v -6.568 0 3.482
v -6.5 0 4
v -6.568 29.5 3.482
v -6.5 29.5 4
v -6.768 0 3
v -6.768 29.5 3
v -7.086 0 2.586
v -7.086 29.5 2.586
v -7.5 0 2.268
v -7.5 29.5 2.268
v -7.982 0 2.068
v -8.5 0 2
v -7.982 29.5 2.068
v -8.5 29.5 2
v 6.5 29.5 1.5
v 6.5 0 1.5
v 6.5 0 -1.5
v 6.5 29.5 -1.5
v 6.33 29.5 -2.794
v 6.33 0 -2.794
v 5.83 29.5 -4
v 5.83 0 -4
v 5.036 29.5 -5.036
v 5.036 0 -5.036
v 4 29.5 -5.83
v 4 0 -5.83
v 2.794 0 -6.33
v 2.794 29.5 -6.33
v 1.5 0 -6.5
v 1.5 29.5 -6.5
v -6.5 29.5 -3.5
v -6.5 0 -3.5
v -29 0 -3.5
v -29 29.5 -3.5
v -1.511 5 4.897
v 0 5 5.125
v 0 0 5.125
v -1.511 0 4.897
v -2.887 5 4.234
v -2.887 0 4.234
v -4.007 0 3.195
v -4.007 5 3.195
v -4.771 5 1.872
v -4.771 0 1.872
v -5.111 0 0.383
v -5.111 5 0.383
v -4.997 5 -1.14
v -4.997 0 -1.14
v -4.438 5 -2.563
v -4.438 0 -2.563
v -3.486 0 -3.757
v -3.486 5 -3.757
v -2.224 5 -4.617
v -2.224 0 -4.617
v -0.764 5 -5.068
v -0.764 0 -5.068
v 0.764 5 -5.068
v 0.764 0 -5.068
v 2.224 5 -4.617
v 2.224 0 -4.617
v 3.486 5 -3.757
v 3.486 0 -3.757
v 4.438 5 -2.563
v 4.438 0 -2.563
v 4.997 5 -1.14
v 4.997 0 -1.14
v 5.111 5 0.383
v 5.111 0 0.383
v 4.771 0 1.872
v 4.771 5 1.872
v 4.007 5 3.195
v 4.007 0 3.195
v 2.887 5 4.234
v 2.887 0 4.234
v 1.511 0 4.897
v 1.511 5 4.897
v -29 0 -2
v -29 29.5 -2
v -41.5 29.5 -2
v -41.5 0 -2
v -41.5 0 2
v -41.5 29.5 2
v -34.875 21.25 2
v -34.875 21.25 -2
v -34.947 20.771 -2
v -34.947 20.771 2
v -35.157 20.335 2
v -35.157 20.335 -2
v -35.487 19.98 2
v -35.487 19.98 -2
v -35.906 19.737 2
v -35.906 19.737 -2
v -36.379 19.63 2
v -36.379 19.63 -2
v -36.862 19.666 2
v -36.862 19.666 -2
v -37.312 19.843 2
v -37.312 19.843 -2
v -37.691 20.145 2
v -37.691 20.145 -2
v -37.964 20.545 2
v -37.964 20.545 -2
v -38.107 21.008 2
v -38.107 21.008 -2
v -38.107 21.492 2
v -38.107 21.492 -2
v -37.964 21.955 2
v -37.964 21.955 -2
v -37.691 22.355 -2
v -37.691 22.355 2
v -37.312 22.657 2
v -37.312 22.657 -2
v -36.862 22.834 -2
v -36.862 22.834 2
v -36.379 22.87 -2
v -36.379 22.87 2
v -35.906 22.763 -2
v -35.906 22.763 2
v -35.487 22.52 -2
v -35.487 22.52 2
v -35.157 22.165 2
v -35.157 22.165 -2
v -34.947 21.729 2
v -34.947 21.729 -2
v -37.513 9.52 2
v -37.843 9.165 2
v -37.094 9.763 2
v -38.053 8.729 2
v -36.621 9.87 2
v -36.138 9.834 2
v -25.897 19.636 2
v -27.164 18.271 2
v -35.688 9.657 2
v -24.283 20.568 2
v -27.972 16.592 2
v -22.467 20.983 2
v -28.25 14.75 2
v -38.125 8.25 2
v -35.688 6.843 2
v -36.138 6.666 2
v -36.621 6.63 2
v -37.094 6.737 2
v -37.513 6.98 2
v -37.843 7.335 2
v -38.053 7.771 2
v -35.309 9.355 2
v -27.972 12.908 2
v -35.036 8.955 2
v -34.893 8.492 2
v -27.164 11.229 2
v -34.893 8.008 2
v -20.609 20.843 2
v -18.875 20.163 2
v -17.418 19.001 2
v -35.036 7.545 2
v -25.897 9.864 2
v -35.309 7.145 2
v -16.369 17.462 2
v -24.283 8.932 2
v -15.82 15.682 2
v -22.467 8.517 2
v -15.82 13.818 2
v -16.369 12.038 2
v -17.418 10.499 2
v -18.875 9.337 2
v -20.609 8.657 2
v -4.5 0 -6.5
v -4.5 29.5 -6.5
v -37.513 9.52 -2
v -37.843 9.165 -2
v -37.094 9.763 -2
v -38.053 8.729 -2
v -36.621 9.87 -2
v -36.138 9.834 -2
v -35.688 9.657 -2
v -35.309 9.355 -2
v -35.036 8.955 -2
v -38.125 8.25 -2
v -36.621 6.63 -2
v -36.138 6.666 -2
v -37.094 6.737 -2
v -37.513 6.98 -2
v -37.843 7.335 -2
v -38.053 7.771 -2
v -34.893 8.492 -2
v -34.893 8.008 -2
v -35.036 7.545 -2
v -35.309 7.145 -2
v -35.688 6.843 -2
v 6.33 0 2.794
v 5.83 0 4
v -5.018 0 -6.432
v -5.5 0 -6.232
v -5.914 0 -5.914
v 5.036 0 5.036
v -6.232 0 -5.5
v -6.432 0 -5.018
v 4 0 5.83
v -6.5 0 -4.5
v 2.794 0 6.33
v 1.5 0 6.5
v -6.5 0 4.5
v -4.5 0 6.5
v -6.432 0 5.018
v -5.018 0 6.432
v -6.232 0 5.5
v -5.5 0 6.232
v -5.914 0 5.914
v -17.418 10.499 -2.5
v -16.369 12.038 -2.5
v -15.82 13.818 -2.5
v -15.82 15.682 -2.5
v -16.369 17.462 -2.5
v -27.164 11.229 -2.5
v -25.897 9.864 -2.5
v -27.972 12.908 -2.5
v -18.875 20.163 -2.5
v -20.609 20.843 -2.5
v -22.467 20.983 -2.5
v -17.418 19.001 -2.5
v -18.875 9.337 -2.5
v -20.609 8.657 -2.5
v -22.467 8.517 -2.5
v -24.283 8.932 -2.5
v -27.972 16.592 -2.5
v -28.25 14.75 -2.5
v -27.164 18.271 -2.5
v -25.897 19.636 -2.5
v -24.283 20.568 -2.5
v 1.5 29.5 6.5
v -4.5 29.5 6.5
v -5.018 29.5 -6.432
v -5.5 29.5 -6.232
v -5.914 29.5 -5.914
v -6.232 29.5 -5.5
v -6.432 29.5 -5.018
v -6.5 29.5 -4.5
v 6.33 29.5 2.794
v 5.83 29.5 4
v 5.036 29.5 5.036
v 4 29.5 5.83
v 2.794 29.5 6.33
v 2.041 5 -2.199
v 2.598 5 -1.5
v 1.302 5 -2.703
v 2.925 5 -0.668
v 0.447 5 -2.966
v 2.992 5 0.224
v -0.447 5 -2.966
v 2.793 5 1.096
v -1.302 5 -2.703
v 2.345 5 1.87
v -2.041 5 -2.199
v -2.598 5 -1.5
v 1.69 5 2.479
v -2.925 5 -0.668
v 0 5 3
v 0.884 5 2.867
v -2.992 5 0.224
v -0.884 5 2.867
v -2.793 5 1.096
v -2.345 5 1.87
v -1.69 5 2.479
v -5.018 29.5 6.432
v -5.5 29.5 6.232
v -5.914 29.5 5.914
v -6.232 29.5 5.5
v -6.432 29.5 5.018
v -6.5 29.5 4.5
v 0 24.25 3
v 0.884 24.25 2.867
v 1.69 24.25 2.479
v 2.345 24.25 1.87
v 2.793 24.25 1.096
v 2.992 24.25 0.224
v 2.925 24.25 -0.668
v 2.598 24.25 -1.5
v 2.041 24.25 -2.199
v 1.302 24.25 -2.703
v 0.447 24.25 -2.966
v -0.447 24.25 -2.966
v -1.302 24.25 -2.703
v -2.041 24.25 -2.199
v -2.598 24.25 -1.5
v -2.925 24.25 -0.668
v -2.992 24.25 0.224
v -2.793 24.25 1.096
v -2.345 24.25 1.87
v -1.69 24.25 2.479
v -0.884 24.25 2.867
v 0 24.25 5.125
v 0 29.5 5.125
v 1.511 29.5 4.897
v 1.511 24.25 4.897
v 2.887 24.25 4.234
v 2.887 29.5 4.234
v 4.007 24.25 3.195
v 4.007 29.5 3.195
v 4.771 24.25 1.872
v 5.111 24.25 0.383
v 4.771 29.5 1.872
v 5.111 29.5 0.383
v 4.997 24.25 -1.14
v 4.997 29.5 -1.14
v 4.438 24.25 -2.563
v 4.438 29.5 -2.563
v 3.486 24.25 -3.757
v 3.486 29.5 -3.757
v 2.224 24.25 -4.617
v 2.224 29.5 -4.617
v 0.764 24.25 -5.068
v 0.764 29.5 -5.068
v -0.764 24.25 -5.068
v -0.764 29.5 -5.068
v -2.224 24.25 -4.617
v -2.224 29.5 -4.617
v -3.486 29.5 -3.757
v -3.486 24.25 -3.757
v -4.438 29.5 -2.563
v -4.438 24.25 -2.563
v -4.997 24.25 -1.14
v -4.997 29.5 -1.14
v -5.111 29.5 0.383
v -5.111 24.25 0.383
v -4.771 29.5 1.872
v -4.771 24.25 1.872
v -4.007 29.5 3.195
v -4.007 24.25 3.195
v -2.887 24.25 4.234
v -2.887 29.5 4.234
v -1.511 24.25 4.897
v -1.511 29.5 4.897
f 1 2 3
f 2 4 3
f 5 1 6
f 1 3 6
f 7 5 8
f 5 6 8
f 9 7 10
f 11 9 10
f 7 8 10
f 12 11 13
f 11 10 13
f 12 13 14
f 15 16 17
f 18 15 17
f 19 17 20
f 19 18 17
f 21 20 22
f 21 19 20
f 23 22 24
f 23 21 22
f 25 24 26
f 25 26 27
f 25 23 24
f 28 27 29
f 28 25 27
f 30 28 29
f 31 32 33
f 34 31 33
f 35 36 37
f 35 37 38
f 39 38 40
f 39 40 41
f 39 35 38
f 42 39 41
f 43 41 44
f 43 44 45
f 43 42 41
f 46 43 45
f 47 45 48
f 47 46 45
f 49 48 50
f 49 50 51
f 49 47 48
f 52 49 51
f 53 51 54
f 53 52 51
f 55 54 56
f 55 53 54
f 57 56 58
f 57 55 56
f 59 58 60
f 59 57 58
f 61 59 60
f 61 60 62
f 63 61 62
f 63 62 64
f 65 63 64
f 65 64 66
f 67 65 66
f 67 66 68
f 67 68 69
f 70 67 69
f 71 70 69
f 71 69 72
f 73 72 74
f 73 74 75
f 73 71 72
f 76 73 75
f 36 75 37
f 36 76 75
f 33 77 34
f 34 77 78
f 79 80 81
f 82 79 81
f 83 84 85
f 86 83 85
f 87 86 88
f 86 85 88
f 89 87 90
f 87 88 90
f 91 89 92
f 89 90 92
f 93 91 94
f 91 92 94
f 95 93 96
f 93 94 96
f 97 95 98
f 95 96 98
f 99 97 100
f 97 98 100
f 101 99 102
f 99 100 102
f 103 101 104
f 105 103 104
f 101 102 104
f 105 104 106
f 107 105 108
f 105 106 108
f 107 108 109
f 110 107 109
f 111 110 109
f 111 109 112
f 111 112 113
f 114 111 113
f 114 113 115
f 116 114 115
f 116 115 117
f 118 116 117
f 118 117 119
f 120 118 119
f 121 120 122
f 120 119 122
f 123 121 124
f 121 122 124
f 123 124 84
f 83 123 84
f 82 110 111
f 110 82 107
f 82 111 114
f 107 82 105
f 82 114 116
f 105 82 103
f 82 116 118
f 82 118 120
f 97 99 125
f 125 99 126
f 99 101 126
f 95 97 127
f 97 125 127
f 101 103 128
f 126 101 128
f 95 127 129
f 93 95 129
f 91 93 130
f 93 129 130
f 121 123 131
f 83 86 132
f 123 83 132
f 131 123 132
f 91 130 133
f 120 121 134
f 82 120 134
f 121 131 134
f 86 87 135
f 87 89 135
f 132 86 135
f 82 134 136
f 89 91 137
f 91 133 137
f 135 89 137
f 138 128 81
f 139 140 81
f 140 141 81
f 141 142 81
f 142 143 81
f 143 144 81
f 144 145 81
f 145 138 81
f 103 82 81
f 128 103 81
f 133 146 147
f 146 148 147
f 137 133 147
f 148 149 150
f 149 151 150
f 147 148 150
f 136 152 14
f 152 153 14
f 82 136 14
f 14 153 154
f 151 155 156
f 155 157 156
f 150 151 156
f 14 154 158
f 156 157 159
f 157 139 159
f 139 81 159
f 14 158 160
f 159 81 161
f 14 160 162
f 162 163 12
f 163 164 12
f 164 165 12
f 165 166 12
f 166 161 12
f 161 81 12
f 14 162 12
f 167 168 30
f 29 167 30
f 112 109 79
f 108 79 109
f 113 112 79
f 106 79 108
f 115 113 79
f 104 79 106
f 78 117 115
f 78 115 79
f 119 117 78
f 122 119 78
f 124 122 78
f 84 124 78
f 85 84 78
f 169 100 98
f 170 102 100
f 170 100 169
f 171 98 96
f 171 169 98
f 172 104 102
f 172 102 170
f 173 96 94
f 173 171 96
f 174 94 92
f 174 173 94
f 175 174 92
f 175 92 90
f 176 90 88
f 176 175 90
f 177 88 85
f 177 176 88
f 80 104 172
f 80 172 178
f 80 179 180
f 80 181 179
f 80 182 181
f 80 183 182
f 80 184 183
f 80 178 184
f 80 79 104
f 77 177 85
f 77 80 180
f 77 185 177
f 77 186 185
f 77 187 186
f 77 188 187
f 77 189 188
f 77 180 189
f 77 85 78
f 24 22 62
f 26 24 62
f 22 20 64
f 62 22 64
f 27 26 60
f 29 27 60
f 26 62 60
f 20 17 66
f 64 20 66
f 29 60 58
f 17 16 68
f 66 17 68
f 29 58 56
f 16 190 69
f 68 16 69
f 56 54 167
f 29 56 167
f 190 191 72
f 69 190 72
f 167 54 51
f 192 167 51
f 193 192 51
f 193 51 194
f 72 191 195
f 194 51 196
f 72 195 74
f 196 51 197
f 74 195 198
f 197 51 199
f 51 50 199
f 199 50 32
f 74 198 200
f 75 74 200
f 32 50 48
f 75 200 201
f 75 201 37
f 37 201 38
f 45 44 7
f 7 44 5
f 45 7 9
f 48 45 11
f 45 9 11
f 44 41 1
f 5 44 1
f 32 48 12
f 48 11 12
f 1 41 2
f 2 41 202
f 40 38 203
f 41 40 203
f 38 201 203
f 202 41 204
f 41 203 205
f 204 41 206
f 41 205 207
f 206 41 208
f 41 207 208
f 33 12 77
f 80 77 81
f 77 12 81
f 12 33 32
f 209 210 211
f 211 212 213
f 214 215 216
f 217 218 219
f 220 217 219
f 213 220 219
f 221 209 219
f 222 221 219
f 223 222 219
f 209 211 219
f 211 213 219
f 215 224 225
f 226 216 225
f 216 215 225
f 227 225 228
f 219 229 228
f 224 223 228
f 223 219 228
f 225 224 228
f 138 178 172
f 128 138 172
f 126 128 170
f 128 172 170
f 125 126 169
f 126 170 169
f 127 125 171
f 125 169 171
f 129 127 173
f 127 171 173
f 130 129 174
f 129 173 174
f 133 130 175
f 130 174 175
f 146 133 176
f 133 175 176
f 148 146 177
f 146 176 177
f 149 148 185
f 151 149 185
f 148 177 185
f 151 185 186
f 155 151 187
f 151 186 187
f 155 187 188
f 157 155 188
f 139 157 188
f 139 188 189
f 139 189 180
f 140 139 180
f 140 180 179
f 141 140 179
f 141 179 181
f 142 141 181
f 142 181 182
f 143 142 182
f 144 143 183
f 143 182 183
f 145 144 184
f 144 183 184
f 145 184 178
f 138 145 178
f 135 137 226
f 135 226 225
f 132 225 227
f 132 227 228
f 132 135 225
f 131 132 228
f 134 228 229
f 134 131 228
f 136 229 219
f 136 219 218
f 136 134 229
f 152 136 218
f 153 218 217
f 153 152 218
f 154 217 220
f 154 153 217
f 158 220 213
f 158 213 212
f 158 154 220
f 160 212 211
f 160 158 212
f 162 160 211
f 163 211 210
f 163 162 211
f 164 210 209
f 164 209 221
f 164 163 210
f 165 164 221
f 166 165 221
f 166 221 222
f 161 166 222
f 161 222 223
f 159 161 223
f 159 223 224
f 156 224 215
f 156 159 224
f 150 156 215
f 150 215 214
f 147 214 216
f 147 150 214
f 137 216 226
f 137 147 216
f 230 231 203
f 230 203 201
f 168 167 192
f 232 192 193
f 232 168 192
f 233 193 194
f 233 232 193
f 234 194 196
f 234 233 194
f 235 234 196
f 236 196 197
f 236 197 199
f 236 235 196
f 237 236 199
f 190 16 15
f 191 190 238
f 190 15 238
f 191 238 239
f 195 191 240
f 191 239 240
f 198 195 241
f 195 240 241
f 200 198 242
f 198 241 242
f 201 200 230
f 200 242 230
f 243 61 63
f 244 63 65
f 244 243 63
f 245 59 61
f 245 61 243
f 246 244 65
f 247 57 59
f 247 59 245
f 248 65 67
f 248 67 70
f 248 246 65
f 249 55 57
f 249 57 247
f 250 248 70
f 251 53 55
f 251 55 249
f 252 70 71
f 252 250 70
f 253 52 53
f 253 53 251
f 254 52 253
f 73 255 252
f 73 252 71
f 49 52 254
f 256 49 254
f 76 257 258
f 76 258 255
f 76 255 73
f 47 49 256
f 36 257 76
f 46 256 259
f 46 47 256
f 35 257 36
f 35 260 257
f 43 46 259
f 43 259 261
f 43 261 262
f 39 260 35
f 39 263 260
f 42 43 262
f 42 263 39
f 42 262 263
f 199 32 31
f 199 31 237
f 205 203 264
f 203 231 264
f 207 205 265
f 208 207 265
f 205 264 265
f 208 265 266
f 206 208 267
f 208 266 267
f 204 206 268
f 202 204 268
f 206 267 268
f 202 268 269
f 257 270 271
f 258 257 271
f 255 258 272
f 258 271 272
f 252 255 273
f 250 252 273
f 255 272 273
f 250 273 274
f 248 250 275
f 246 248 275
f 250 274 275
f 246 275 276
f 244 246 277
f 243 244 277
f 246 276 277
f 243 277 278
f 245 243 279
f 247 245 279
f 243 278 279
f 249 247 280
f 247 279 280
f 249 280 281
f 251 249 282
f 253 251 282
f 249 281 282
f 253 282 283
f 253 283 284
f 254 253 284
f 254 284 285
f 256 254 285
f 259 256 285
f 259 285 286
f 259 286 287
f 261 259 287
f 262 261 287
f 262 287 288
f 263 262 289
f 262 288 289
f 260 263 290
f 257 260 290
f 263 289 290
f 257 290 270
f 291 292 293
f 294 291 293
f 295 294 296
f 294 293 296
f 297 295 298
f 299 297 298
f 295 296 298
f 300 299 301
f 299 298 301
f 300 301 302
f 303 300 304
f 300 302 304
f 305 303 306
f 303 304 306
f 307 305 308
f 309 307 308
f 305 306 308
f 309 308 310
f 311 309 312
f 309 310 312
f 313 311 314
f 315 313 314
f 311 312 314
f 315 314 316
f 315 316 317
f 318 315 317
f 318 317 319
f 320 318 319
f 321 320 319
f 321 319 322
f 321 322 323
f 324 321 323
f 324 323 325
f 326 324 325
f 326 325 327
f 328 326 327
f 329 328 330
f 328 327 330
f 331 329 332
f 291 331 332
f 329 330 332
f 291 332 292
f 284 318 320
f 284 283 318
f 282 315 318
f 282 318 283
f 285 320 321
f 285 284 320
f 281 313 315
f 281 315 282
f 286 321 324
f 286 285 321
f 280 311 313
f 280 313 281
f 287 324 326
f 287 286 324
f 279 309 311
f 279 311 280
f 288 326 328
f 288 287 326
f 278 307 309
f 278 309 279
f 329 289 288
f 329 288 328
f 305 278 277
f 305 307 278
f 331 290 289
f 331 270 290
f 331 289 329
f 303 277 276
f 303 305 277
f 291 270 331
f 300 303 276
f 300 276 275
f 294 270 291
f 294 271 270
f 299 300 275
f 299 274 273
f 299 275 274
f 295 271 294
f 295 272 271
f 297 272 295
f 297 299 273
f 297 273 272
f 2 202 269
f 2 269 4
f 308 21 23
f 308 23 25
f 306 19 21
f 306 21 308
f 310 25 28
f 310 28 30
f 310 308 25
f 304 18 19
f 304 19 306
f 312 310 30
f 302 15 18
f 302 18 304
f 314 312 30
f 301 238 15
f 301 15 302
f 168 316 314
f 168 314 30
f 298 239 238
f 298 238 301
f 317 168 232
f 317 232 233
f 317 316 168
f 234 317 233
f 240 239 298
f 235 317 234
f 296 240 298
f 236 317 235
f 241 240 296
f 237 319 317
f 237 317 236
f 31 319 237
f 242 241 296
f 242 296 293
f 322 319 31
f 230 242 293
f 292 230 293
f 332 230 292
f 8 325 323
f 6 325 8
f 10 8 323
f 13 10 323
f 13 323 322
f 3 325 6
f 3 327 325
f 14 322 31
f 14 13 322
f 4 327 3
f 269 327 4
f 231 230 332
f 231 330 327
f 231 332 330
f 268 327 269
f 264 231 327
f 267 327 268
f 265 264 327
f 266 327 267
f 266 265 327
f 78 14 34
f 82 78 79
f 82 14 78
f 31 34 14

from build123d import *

# Parameters (mm, degrees)
SKETCH1_W                = 13
SKETCH1_H                = 13
BALL_BEARING_BLOCK_DEPTH = 29.5
SKETCH2_W                = 35
SKETCH2_H                = 4
PADDLE_PLATE_DEPTH       = 29.5
SKETCH3_R                = 5.125
BALLBEARING_1_DEPTH      = 5.25
BALLBEARING_START        = -5
SKETCH4_R                = 5.125
BALLBEARING_2_DEPTH      = 5
SKETCH5_R                = 3
ACHSE_DEPTH              = 19.25
FILLET1_R                = 5
FILLET2_R                = 5
FILLET3_R                = 2
FILLET4_R                = 2
FILLET7_R                = 2
SKETCH6_R                = 1.625
M3_PADDLE_SCREWS_DEPTH   = 4
SKETCH8_W                = 22.5
SKETCH8_H                = 29.5
TOP_PLATE_DEPTH          = 1.5
SKETCH7_R                = 6.25
MAGNET_POCKET_DEPTH      = 4.5


with BuildPart() as part:
    # Sketch1 → Ball Bearing Block (new body)
    with BuildSketch(Plane(origin=(0, 0, 0), x_dir=(1, 0, 0), z_dir=(0, 1, 0))):
        Rectangle(SKETCH1_W, SKETCH1_H)
    extrude(amount=BALL_BEARING_BLOCK_DEPTH)

    # Sketch2 → Paddle Plate (add)
    with BuildSketch(Plane.XZ):
        with Locations((-24, 0)):
            Rectangle(SKETCH2_W, SKETCH2_H)
    extrude(amount=-PADDLE_PLATE_DEPTH)

    # Sketch3 → Ballbearing 1 (cut)
    with BuildSketch(Plane(origin=(0, 29.5, 0), x_dir=(1, 0, 0), z_dir=(0, 1, 0))):
        with Locations(Location((0, 0, 0), (0, 0, 270))):
            Circle(SKETCH3_R)
    extrude(amount=-BALLBEARING_1_DEPTH, mode=Mode.SUBTRACT)

    # Sketch4 → Ballbearing 2 (cut)
    with BuildSketch(Plane.XZ.offset(BALLBEARING_START)):
        with Locations(Location((0, 0, 0), (0, 0, 90))):
            Circle(SKETCH4_R)
    extrude(amount=BALLBEARING_2_DEPTH, mode=Mode.SUBTRACT)

    # Sketch5 → Achse (cut)
    with BuildSketch(Plane(origin=(0, 24.25, 0), x_dir=(1, 0, 0), z_dir=(0, 1, 0))):
        with Locations(Location((0, 0, 0), (0, 0, 270))):
            Circle(SKETCH5_R)
    extrude(amount=-ACHSE_DEPTH, mode=Mode.SUBTRACT)

    # Fillet1
    fillet1_edges = [part.edges().sort_by_distance(p)[0] for p in [
        (6.5, 14.75, -6.5),
    ]]
    fillet(fillet1_edges, radius=FILLET1_R)

    # Fillet2
    fillet2_edges = [part.edges().sort_by_distance(p)[0] for p in [
        (6.5, 14.75, 6.5),
    ]]
    fillet(fillet2_edges, radius=FILLET2_R)

    # Fillet3
    fillet3_edges = [part.edges().sort_by_distance(p)[0] for p in [
        (-6.5, 14.75, -6.5),
    ]]
    fillet(fillet3_edges, radius=FILLET3_R)

    # Fillet4
    fillet4_edges = [part.edges().sort_by_distance(p)[0] for p in [
        (-6.5, 14.75, 6.5),
    ]]
    fillet(fillet4_edges, radius=FILLET4_R)

    # Fillet7
    fillet7_edges = [part.edges().sort_by_distance(p)[0] for p in [
        (-6.5, 14.75, 2),
    ]]
    fillet(fillet7_edges, radius=FILLET7_R)

    # Sketch6 → M3 Paddle Screws (cut)
    with BuildSketch(Plane(origin=(0, 0, -2), x_dir=(-1, 0, 0), z_dir=(0, 0, -1))):
        with Locations((36.5, 8.25)):
            Circle(SKETCH6_R)
        with Locations(Location((36.5, 21.25, 0), (0, 0, 180))):
            Circle(SKETCH6_R)
    extrude(amount=-M3_PADDLE_SCREWS_DEPTH, mode=Mode.SUBTRACT)

    # Sketch8 → Top Plate (add)
    with BuildSketch(Plane(origin=(0, 0, -2), x_dir=(-1, 0, 0), z_dir=(0, 0, -1))):
        with Locations((17.75, 14.75)):
            Rectangle(SKETCH8_W, SKETCH8_H)
    extrude(amount=TOP_PLATE_DEPTH)

    # Sketch7 → Magnet Pocket (cut)
    with BuildSketch(Plane(origin=(0, 0, 2), x_dir=(-1, 0, 0), z_dir=(0, 0, -1))):
        with Locations((22, 14.75)):
            Circle(SKETCH7_R)
    extrude(amount=MAGNET_POCKET_DEPTH, mode=Mode.SUBTRACT)


solid = part.part
